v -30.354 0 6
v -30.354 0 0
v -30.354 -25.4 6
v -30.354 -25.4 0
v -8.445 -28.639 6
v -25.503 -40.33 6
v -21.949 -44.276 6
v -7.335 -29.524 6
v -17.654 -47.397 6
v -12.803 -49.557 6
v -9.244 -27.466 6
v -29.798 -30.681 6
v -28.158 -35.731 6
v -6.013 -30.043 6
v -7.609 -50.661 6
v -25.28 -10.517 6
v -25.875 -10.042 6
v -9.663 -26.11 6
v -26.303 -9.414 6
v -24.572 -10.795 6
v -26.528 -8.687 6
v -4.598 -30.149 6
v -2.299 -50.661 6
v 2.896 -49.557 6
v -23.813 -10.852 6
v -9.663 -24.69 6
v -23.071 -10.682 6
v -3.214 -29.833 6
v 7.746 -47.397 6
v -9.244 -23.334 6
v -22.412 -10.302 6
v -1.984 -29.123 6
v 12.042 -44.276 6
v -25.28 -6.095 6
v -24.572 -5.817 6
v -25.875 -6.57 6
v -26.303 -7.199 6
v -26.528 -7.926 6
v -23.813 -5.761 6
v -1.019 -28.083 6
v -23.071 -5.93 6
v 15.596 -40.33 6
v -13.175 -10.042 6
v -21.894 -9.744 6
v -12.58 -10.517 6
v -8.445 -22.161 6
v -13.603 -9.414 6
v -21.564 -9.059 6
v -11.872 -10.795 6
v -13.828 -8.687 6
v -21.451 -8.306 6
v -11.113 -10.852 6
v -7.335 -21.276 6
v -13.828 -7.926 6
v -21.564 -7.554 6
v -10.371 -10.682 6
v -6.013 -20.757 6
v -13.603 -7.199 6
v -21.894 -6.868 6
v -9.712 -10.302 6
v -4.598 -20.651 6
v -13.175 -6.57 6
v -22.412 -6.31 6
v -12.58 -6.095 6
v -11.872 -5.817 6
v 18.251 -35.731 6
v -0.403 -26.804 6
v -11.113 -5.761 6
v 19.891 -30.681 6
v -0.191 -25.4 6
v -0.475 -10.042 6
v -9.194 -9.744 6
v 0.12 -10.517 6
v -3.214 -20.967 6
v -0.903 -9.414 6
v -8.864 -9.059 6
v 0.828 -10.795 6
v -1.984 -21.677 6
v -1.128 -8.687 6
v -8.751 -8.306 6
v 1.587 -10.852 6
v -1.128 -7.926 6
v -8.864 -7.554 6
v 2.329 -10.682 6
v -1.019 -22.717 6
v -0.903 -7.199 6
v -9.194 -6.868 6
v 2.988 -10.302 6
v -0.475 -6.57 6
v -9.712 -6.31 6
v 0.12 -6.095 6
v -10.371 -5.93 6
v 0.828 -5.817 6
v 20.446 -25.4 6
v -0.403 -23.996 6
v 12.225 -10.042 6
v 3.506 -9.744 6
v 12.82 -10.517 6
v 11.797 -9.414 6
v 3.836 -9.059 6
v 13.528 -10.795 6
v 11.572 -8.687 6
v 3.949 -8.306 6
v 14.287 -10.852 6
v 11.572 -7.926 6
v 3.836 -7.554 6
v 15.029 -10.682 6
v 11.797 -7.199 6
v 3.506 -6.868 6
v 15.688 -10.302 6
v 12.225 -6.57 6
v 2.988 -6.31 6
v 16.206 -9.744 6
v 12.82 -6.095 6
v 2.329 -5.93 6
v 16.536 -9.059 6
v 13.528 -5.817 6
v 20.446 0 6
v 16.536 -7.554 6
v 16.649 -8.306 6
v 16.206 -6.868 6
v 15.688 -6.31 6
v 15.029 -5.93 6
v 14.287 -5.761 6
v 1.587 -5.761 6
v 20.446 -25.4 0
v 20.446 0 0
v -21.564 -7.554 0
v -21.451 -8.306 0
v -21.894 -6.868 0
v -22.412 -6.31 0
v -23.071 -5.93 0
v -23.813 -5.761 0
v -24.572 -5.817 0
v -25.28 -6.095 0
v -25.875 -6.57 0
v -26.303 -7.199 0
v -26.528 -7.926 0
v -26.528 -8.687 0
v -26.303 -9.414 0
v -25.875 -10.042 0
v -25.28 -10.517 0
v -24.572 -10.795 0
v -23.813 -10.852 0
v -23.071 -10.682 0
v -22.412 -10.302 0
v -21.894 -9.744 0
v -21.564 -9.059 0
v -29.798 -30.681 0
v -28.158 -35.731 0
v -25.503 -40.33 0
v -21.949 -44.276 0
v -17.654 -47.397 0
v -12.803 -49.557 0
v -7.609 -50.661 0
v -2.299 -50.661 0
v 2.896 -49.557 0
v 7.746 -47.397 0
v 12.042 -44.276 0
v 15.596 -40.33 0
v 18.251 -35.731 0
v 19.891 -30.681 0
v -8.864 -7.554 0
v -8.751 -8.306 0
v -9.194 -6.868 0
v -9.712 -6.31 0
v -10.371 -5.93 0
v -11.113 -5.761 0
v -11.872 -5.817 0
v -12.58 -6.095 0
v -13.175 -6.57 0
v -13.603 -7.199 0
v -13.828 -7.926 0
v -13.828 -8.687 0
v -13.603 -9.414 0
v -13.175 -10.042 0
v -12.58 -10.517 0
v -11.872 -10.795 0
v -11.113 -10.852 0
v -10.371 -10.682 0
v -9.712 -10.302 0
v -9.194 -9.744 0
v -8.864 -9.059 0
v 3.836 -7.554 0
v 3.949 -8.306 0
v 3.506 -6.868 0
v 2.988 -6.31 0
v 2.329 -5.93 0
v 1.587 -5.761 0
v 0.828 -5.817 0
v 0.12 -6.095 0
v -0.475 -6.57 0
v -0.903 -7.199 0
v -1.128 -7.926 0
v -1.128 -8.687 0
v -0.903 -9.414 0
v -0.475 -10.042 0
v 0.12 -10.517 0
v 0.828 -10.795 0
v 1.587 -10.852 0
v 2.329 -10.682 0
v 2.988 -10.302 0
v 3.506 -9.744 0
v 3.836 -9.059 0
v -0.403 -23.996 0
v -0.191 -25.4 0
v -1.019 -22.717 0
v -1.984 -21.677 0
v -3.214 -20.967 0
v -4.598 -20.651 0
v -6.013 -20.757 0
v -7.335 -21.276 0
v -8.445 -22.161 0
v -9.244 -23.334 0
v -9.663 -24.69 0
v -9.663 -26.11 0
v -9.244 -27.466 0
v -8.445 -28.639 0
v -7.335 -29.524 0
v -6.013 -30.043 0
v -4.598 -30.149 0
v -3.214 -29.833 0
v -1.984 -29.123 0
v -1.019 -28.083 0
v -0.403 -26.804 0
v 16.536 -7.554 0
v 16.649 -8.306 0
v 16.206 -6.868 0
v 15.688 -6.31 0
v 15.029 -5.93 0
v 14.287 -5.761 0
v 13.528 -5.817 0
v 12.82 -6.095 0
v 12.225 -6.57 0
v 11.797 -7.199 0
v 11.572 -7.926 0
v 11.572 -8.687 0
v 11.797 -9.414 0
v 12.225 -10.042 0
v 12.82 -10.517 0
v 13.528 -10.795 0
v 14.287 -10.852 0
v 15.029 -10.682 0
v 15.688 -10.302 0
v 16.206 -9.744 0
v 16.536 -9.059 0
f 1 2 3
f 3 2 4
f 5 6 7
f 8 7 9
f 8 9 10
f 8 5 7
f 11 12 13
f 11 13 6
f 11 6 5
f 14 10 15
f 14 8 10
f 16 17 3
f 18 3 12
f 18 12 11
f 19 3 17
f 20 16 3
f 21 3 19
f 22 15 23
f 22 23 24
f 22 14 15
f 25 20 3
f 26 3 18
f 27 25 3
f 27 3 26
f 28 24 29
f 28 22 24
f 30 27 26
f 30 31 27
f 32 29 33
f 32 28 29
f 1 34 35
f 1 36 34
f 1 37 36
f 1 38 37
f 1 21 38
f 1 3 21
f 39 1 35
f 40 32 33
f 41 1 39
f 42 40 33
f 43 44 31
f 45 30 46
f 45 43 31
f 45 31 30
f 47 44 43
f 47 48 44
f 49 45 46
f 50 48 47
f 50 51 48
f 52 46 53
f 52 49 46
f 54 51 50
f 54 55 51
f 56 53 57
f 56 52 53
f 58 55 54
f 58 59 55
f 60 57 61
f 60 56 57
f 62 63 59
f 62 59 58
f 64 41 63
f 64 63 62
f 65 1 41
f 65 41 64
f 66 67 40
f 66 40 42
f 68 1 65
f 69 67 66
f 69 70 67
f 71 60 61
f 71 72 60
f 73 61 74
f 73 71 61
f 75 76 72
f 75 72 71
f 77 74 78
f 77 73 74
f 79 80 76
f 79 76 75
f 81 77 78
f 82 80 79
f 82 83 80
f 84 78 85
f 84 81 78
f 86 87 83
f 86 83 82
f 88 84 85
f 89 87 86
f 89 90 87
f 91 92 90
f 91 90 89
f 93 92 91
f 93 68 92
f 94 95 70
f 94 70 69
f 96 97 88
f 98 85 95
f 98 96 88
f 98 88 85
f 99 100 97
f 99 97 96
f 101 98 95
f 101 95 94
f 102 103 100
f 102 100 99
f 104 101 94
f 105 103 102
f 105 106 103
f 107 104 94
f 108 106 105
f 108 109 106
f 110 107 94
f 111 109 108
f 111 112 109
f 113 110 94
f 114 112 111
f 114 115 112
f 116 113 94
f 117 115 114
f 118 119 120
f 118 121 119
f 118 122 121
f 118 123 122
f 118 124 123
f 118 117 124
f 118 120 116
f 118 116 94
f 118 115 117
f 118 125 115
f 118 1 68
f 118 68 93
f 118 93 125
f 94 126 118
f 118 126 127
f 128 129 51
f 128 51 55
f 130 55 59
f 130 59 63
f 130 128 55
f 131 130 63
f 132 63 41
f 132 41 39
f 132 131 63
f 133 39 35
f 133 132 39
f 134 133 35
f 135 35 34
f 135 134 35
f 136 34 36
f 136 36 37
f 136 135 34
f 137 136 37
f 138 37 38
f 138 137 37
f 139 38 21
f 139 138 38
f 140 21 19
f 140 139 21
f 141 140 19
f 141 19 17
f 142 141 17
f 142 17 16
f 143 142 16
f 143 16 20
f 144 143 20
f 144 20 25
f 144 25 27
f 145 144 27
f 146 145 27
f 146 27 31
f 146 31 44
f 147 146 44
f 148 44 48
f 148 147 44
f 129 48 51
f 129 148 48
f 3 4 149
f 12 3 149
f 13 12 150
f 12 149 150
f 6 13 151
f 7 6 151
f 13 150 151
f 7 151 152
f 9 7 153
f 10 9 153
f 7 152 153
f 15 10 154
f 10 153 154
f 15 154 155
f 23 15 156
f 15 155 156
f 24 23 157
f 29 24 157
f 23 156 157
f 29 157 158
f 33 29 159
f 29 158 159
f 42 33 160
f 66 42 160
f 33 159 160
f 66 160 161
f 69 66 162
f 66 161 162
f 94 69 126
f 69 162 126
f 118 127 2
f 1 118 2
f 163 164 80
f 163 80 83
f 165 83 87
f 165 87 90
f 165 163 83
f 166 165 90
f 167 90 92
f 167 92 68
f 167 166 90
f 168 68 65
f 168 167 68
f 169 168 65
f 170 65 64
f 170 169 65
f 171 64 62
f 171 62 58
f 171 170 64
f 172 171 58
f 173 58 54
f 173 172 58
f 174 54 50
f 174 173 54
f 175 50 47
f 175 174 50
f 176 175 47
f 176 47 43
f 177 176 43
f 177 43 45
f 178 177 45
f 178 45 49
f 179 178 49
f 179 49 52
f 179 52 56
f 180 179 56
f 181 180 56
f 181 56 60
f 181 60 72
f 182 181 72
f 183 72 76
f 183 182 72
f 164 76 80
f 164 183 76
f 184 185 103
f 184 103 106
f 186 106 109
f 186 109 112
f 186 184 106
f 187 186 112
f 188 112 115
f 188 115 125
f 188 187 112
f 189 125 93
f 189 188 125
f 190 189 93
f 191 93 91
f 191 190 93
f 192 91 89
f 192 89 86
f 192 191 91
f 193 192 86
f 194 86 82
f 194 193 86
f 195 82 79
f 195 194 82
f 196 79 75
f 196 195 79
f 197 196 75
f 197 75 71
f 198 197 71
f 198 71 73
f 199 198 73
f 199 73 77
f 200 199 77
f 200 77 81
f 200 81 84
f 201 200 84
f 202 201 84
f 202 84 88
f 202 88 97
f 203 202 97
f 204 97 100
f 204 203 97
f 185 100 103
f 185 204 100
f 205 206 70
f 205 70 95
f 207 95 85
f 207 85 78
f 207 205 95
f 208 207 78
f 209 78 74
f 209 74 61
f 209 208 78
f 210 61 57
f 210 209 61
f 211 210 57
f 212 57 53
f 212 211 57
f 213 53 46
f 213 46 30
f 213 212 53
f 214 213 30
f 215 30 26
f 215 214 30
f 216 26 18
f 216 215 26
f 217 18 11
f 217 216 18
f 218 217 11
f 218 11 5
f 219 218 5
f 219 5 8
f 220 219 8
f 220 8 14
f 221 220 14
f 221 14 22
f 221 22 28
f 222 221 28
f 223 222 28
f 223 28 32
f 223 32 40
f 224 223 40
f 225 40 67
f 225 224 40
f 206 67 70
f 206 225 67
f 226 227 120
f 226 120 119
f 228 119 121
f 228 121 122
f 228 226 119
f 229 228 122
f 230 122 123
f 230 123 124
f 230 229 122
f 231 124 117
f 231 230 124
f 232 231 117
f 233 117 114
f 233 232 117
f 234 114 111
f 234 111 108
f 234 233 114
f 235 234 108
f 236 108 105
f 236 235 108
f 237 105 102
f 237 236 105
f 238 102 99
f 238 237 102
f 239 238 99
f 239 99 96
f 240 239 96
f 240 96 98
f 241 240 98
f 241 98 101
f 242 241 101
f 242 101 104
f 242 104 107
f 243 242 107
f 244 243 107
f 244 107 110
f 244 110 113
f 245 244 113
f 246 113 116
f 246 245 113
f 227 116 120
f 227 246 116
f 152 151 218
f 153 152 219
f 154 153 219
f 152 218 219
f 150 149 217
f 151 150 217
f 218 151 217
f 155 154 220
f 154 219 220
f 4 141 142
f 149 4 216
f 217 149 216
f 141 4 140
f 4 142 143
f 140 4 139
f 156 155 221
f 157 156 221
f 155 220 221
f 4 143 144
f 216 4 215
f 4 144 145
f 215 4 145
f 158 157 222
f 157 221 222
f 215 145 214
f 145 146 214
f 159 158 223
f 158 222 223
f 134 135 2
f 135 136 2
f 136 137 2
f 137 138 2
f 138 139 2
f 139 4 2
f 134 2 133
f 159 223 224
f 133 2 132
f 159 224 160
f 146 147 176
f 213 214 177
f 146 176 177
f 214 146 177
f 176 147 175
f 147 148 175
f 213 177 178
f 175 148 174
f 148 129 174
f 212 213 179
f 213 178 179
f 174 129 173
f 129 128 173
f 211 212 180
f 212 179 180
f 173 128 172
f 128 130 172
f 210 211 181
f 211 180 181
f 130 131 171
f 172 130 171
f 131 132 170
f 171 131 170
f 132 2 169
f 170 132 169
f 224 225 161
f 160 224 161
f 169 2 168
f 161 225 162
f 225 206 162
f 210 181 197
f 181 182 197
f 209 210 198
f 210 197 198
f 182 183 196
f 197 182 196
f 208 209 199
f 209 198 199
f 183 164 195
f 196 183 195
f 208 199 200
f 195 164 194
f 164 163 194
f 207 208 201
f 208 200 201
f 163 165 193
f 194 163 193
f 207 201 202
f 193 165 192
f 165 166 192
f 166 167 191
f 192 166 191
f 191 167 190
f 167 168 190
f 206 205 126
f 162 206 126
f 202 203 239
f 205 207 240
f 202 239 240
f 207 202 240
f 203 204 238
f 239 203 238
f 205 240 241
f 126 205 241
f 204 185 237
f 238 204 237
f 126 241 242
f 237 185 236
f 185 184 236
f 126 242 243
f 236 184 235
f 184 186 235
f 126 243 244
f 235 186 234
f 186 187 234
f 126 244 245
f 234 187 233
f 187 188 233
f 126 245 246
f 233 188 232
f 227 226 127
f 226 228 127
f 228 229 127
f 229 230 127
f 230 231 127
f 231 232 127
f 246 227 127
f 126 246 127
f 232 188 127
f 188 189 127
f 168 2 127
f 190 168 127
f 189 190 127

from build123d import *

# Parameters (mm, degrees)
F0_R     = 4.7625
F0_R_2   = 2.5527
F1_DEPTH = 6


with BuildPart() as f1:
    # F0 (on Top) → F1 (new body)
    with BuildSketch(Plane.XY):
        with BuildLine():
            Line((20.446472, 0), (-30.353528, 0))
            Line((-30.353528, 0), (-30.353528, -25.4))
            ThreePointArc((-30.353528, -25.4), (-4.953528, -50.8), (20.446472, -25.4))
            Line((20.446472, -25.4), (20.446472, 0))
        make_face()
        with Locations((-4.953528, -25.4)):
            Circle(F0_R, mode=Mode.SUBTRACT)
        with Locations((-24.003528, -8.3061)):
            Circle(F0_R_2, mode=Mode.SUBTRACT)
        with Locations((-11.303528, -8.3061)):
            Circle(F0_R_2, mode=Mode.SUBTRACT)
        with Locations((1.396472, -8.3061)):
            Circle(F0_R_2, mode=Mode.SUBTRACT)
        with Locations((14.096472, -8.3061)):
            Circle(F0_R_2, mode=Mode.SUBTRACT)
    extrude(amount=F1_DEPTH)


solid = f1.part
